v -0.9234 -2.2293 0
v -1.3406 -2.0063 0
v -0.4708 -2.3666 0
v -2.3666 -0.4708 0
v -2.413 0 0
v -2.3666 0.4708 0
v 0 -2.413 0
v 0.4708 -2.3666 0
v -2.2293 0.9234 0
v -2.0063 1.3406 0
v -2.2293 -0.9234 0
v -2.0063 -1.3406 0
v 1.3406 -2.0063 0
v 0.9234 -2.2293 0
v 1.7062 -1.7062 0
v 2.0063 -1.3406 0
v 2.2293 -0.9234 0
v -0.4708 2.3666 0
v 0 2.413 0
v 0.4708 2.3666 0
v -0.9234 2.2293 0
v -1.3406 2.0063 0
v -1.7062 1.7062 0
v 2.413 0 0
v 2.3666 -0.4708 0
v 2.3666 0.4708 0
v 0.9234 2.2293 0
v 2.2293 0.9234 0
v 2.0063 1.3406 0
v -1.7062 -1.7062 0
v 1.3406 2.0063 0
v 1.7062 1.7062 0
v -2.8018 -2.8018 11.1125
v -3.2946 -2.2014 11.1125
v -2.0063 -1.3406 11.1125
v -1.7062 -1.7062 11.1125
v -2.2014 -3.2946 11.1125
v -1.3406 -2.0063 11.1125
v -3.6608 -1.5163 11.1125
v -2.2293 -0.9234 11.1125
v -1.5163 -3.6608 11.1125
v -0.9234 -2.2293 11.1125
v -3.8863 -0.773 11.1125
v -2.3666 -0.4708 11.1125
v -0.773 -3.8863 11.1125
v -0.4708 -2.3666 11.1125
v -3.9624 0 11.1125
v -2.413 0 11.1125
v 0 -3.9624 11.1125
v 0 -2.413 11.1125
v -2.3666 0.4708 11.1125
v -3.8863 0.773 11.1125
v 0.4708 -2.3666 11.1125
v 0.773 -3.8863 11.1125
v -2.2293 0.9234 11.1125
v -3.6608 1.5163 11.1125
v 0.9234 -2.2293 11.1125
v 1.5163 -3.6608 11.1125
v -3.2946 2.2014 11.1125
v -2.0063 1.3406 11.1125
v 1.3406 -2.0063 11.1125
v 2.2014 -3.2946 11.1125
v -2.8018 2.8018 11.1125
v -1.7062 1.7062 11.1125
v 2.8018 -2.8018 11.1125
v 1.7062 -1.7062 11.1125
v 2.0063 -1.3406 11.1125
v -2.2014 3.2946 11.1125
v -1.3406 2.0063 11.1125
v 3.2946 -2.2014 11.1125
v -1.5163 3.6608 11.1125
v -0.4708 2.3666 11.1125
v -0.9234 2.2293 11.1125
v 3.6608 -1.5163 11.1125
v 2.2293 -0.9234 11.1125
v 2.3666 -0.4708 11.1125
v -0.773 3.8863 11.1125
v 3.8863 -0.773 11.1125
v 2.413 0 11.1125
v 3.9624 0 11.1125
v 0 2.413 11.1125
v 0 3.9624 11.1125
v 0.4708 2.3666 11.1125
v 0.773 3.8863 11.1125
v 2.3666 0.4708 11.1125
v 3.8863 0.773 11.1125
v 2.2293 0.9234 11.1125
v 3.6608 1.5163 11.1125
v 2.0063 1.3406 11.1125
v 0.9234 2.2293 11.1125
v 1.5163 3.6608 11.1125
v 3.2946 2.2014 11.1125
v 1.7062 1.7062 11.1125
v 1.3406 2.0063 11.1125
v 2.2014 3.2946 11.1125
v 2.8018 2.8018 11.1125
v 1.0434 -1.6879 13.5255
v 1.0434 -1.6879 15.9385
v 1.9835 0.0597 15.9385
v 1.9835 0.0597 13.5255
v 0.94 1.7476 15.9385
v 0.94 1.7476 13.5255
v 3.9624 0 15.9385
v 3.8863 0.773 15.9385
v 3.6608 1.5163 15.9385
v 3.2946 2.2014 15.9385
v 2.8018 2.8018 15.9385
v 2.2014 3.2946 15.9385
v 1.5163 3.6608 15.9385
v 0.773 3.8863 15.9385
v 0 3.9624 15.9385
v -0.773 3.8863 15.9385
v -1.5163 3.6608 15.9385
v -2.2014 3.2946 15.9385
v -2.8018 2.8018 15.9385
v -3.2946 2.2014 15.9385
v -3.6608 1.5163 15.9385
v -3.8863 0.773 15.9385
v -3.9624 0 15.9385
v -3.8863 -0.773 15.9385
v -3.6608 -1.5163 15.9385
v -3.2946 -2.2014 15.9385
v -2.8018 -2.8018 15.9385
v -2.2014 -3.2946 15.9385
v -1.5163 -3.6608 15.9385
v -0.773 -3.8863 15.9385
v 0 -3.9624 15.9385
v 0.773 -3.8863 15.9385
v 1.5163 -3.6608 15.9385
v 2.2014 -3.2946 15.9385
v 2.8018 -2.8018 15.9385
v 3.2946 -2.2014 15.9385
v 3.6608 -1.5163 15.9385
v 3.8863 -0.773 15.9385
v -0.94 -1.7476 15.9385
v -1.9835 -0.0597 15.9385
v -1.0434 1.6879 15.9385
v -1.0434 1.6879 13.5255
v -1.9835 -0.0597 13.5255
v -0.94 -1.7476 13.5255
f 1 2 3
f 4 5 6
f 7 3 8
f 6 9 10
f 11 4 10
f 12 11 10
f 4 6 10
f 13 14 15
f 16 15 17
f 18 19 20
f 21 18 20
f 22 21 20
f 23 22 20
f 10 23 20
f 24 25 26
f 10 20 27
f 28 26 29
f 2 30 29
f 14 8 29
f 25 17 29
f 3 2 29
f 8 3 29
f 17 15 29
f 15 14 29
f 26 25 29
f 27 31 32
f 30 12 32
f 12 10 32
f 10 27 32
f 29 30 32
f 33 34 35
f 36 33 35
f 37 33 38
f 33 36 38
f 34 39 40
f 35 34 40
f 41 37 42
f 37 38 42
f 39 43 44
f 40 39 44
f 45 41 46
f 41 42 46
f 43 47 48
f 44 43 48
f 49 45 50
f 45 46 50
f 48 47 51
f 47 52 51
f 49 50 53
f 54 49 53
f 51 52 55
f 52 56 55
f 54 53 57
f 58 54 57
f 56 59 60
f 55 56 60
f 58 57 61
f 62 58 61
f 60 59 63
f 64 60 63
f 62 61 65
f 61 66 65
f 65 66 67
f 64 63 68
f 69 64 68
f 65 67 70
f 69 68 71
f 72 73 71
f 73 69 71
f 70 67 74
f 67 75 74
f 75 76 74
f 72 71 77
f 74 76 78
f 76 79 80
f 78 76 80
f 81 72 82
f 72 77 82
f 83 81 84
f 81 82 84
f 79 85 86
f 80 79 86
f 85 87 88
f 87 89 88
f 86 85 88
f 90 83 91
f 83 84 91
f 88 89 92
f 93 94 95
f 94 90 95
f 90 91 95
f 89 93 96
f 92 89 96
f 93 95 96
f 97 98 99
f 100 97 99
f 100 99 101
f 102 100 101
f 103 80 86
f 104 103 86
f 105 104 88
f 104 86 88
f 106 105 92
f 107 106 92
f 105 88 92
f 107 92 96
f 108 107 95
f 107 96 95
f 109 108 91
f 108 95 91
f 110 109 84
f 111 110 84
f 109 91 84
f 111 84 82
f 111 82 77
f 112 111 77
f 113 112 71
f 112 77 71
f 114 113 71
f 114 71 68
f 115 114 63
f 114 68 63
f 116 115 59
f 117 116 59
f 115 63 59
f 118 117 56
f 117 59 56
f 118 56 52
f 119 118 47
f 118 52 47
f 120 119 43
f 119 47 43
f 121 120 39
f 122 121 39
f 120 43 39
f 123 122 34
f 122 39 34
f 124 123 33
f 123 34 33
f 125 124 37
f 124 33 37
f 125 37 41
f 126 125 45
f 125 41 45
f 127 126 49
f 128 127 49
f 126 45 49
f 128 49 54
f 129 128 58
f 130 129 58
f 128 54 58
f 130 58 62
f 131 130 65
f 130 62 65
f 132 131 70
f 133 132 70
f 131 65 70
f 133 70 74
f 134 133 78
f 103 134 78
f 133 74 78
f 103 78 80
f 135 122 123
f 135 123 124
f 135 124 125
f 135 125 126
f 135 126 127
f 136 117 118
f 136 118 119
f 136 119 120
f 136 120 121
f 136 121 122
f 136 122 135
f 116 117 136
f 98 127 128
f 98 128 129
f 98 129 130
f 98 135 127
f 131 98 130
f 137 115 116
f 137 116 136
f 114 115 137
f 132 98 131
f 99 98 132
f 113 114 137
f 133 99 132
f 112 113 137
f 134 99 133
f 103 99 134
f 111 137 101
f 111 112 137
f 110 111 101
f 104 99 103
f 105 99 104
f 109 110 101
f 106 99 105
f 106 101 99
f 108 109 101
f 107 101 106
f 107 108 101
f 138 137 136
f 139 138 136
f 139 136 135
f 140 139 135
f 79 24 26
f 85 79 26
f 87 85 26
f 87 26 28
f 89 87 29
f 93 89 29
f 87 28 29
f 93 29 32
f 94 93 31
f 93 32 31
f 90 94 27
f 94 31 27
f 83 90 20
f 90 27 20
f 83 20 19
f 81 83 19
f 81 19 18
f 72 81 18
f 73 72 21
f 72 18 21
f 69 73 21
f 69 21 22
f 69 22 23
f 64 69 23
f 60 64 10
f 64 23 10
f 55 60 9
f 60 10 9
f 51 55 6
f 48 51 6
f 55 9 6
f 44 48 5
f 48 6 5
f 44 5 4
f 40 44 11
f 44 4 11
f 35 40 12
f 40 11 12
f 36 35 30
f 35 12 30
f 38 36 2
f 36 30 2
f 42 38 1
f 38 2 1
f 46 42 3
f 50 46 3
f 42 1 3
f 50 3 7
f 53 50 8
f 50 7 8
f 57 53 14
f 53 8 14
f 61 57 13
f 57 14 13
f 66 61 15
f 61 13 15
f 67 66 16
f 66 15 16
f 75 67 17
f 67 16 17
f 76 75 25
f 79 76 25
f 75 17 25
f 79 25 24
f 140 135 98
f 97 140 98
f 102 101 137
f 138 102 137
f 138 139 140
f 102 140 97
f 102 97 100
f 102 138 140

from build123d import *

# Parameters (mm, degrees)
SKETCH1_R           = 2.413
BOSS_EXTRUDE1_DEPTH = 11.1125
SKETCH2_R           = 3.9624
BOSS_EXTRUDE2_DEPTH = 4.826
CUT_EXTRUDE1_DEPTH  = 2.413


with BuildPart() as part:
    # Sketch1 → Boss-Extrude1 (new body)
    with BuildSketch(Plane.XY):
        Circle(SKETCH1_R)
    extrude(amount=BOSS_EXTRUDE1_DEPTH)

    # Sketch2 → Boss-Extrude2 (add)
    with BuildSketch(Plane.XY.offset(11.1125)):
        Circle(SKETCH2_R)
    extrude(amount=BOSS_EXTRUDE2_DEPTH)

    # Sketch3 → Cut-Extrude1 (cut)
    with BuildSketch(Plane.XY.offset(15.9385)):
        Polygon((0.940029384, 1.747595175), (-1.043447125, 1.687886915), (-1.98347651, -0.059708261), (-0.940029384, -1.747595175), (1.043447125, -1.687886915), (1.98347651, 0.059708261), align=None)
    extrude(amount=-CUT_EXTRUDE1_DEPTH, mode=Mode.SUBTRACT)


solid = part.part
